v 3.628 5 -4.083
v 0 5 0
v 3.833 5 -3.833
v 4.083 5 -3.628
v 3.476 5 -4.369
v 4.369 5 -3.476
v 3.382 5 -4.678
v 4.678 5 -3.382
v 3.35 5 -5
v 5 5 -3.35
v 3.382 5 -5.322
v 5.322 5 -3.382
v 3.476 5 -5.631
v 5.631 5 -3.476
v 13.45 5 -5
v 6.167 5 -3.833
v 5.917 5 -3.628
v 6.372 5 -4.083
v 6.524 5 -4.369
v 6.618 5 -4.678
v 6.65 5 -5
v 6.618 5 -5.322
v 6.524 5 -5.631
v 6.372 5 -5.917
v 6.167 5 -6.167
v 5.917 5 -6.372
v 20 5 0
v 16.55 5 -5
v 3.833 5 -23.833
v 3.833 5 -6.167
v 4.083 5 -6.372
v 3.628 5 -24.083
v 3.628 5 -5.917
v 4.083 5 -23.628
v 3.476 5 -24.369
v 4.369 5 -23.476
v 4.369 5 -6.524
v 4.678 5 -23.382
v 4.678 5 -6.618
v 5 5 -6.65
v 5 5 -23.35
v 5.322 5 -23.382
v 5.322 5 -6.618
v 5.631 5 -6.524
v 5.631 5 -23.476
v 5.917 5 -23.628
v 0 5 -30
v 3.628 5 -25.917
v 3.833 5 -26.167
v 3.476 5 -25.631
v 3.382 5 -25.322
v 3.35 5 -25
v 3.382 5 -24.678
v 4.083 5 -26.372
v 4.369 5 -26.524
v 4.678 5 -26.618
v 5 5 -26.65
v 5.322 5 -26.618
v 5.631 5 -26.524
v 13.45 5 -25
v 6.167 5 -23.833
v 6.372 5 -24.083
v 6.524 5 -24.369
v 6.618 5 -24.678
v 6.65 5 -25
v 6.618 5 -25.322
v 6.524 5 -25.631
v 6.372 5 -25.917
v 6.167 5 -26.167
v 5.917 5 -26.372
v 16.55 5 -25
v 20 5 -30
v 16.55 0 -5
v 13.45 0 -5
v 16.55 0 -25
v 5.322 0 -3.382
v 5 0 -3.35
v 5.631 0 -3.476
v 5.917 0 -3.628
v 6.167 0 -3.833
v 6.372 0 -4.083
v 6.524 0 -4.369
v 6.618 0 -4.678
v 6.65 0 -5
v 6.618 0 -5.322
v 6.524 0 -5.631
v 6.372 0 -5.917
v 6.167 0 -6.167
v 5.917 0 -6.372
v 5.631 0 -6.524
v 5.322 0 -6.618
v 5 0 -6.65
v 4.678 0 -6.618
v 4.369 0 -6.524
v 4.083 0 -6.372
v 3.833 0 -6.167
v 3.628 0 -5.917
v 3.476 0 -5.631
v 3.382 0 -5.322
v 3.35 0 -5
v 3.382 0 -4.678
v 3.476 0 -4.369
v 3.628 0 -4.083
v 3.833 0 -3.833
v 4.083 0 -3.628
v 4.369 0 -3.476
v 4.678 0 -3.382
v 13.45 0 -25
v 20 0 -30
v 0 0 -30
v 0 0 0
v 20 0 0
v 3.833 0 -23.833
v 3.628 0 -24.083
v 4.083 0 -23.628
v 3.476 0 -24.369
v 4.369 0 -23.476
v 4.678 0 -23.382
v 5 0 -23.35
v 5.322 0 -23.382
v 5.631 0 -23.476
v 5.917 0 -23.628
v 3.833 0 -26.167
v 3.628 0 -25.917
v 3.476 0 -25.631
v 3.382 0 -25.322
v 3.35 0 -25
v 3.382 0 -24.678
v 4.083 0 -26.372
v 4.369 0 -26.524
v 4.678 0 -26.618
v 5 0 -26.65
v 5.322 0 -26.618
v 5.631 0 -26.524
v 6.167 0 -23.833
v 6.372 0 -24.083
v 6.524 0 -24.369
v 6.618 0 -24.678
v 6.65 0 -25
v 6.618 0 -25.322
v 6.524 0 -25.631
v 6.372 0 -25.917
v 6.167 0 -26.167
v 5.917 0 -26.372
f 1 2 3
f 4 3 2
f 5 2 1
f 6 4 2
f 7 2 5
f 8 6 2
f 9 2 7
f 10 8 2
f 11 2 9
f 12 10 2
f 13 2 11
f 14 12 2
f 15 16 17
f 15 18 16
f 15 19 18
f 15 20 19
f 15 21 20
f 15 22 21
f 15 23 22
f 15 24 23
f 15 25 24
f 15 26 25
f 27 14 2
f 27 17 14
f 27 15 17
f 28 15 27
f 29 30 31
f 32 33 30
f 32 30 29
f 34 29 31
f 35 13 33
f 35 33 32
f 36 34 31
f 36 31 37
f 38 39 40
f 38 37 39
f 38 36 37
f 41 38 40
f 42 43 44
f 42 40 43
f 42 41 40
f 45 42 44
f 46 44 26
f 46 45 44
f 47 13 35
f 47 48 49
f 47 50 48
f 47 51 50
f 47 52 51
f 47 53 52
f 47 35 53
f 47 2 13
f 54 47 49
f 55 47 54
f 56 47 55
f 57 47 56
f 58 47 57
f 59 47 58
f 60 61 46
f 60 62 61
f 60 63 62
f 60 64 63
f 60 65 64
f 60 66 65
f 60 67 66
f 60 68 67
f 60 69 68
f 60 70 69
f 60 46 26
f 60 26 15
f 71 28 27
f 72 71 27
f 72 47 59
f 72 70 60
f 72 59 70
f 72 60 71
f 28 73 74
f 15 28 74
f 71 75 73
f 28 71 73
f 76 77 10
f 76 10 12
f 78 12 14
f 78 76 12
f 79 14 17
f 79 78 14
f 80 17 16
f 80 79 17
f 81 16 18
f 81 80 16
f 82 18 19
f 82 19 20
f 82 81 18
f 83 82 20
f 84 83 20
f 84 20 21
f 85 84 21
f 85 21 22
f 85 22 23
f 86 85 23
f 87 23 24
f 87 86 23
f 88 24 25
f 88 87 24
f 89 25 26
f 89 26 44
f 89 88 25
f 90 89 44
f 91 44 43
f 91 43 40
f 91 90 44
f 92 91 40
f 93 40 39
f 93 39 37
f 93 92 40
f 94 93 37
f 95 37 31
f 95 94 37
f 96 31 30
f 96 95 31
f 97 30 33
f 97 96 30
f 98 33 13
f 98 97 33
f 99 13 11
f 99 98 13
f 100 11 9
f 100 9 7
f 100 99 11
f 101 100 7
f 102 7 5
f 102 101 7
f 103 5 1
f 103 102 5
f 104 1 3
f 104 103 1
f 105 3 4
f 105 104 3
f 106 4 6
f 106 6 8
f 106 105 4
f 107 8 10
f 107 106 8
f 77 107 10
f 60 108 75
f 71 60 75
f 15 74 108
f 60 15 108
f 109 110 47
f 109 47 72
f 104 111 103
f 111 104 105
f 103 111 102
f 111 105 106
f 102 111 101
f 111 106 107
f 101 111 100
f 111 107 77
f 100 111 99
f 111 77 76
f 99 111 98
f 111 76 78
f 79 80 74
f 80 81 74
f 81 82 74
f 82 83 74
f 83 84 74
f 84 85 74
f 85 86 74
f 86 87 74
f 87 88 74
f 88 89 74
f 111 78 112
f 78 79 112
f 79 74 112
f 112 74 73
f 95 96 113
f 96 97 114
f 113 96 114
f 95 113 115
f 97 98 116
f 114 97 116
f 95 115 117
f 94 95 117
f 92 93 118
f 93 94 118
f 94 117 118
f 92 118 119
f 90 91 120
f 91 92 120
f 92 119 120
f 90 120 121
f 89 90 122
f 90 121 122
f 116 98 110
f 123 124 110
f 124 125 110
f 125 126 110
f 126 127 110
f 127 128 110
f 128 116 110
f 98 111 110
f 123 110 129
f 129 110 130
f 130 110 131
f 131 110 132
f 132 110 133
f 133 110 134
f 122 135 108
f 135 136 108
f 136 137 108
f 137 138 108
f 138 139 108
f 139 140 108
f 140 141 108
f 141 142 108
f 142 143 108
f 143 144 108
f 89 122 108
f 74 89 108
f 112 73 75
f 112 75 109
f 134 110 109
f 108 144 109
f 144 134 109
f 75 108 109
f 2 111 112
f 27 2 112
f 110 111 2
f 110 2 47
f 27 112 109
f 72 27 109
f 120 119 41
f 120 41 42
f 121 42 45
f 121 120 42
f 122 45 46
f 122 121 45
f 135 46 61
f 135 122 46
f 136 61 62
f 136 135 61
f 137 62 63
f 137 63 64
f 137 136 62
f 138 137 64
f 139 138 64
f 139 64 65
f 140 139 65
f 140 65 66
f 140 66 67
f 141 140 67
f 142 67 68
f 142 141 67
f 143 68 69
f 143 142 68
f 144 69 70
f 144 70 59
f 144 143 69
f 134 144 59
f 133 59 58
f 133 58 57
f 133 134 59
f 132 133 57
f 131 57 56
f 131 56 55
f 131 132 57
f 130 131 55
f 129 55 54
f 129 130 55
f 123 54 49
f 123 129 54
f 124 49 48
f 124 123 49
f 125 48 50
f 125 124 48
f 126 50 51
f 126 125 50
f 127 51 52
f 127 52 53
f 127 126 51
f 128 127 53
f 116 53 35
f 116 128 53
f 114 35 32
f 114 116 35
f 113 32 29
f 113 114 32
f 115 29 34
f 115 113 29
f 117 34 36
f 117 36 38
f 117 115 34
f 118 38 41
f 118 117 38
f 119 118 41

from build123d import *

# Parameters (mm, degrees)
SKETCH1_W           = 10
SKETCH1_H           = 15
SKETCH1_R           = 1.65
BOSS_EXTRUDE1_DEPTH = 5


with BuildPart() as part:
    # Sketch1 → Boss-Extrude1 (new body)
    # profile 1 of 4: a face of its own
    with BuildSketch(Plane(origin=(0, 0, 0), x_dir=(1, 0, 0), z_dir=(0, 1, 0))):
        with Locations((5, 22.5)):
            Rectangle(SKETCH1_W, SKETCH1_H)
        with Locations(Location((5, 25, 0), (0, 0, 270))):
            Circle(SKETCH1_R, mode=Mode.SUBTRACT)
    # profile 2 of 4: a face of its own
    with BuildSketch(Plane(origin=(0, 0, 0), x_dir=(1, 0, 0), z_dir=(0, 1, 0))):
        Polygon((10, 30), (10, 15), (13.45, 15), (13.45, 25), (16.55, 25), (16.55, 15), (20, 15), (20, 30), align=None)
    # profile 3 of 4: a face of its own
    with BuildSketch(Plane(origin=(0, 0, 0), x_dir=(1, 0, 0), z_dir=(0, 1, 0))):
        Polygon((13.45, 15), (10, 15), (10, 0), (20, 0), (20, 15), (16.55, 15), (16.55, 5), (13.45, 5), align=None)
    # profile 4 of 4: a face of its own
    with BuildSketch(Plane(origin=(0, 0, 0), x_dir=(1, 0, 0), z_dir=(0, 1, 0))):
        with Locations((5, 7.5)):
            Rectangle(SKETCH1_W, SKETCH1_H)
        with Locations(Location((5, 5, 0), (0, 0, 270))):
            Circle(SKETCH1_R, mode=Mode.SUBTRACT)
    extrude(amount=BOSS_EXTRUDE1_DEPTH)


solid = part.part
